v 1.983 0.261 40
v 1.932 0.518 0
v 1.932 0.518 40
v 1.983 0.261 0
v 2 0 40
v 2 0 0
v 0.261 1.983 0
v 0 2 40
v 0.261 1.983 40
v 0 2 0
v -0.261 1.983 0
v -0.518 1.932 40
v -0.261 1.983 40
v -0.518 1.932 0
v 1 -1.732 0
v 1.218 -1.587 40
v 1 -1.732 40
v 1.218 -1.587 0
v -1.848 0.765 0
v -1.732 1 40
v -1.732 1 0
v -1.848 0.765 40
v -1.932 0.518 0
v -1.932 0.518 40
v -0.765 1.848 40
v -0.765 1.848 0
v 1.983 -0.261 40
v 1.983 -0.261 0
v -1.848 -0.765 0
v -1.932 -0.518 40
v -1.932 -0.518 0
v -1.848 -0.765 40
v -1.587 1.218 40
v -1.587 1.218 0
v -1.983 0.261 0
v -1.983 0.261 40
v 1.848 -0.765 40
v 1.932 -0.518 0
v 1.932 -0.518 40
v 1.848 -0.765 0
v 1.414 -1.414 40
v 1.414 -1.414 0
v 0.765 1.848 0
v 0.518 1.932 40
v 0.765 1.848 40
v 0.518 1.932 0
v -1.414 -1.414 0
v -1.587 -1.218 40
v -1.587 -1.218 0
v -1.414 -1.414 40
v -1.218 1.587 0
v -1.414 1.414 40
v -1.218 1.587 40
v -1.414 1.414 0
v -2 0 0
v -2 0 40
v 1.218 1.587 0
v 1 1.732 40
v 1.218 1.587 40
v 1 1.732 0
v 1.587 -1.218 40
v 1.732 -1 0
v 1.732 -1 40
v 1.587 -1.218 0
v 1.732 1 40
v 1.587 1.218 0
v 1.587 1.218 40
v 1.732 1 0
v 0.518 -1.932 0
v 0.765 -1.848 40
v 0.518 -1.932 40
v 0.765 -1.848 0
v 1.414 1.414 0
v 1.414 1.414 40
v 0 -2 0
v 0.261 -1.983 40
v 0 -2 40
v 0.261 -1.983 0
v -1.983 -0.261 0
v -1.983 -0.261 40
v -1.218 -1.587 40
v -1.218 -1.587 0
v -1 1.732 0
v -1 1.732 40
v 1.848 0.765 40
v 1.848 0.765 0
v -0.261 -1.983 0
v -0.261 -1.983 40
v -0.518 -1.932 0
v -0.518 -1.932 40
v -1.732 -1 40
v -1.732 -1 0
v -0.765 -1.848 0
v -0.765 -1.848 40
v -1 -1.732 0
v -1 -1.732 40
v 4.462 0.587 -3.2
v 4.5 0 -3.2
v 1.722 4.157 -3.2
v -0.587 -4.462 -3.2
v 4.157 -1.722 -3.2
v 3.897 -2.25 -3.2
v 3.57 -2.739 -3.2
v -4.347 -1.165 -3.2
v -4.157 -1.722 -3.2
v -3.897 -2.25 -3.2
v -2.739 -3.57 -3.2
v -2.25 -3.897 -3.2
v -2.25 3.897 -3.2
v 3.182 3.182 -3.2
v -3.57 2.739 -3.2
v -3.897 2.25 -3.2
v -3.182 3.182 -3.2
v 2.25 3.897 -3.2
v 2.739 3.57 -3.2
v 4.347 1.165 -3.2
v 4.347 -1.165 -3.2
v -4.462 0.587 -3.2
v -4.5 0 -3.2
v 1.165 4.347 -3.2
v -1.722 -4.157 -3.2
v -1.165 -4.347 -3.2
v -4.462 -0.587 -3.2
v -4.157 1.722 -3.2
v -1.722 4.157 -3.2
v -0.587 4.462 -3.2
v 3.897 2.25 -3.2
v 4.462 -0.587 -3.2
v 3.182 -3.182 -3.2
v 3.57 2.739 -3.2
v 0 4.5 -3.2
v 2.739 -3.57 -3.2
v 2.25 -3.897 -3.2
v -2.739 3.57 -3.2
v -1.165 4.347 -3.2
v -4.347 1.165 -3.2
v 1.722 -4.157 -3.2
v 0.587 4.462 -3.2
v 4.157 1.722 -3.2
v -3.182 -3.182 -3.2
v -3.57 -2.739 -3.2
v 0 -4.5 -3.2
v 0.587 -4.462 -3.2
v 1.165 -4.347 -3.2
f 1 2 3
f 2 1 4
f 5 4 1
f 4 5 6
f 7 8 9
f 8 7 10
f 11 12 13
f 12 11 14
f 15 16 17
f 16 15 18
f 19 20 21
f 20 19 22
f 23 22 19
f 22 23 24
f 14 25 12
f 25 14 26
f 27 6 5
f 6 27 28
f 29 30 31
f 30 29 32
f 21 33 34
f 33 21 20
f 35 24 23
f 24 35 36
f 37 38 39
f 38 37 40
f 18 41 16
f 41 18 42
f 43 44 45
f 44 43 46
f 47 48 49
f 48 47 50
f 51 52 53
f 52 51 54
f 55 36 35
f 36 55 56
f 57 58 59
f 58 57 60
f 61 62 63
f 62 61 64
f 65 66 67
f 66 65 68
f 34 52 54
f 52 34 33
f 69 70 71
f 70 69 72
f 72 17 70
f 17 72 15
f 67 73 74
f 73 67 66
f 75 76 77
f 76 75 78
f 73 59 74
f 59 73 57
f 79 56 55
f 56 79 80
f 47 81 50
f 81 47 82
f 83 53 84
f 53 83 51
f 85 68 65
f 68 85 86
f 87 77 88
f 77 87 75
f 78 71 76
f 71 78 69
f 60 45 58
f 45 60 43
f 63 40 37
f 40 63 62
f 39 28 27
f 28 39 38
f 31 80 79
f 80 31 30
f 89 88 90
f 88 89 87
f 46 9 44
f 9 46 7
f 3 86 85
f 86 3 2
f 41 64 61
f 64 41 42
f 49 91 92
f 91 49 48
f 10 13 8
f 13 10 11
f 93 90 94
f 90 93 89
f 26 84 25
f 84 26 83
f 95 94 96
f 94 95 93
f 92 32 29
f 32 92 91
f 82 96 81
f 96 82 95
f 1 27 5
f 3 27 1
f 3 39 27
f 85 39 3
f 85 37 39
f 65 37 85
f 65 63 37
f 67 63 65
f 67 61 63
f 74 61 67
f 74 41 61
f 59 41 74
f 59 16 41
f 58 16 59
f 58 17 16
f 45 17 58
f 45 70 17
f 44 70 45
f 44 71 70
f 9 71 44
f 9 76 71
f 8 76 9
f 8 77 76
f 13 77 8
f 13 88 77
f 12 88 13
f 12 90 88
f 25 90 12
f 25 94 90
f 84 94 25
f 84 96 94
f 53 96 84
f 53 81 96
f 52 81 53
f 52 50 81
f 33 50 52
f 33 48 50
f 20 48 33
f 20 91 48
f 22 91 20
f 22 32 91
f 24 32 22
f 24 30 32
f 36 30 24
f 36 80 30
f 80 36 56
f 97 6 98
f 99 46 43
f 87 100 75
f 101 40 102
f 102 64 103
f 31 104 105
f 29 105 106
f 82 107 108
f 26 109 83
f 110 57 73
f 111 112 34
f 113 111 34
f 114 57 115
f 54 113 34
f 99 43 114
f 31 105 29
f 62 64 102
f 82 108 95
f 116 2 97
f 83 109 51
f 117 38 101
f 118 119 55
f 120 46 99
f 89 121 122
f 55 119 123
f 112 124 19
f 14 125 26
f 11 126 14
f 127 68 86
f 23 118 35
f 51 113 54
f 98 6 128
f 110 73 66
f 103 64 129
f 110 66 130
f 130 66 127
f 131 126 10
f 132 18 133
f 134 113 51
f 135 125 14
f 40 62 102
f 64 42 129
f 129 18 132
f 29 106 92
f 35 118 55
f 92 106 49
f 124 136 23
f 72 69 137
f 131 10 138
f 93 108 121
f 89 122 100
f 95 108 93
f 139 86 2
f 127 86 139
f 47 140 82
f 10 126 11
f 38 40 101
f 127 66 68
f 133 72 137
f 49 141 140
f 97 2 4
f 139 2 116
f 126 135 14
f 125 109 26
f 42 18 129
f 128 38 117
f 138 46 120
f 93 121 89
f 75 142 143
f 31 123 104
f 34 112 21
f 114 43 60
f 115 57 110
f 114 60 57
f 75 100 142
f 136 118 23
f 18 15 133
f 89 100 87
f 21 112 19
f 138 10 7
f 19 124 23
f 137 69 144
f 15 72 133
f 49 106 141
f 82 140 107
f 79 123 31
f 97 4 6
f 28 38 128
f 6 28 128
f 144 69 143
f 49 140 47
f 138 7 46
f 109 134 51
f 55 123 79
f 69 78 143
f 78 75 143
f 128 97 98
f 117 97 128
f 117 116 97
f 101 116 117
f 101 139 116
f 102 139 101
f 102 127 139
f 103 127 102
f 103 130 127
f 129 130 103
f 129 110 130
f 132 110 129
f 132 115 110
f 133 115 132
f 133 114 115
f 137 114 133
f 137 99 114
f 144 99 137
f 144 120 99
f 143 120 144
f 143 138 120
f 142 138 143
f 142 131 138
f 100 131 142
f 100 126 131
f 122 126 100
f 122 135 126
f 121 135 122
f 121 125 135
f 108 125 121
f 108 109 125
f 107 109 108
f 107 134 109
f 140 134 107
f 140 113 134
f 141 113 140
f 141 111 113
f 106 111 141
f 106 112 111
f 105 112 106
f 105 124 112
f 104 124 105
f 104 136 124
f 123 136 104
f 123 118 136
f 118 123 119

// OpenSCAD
// Simplified wood screw for visualisation.
// Open this file directly in OpenSCAD to tune and render the screw.

/* [Dimensions] */
screw_length = 40;
screw_diameter = 4;
screw_head_diameter = 9;
screw_head_height = 3.2;

module screw_between(start, end, diameter, head_diameter, head_height) {
    v = end - start;
    len = norm(v);

    if (len > 0) {
        dir = v / len;
        axis = cross([0, 0, 1], dir);
        angle = acos(dir[2]);

        translate(start)
            rotate(a = angle, v = norm(axis) < 0.0001 ? [1, 0, 0] : axis)
                union() {
                    cylinder(h = len, d = diameter, $fn = 48);
                    translate([0, 0, -head_height])
                        cylinder(h = head_height, d1 = head_diameter, d2 = diameter, $fn = 48);
                }
    }
}

// Standalone component preview/render.
screw_between(
    [0, 0, 0],
    [0, 0, screw_length],
    screw_diameter,
    screw_head_diameter,
    screw_head_height
);
